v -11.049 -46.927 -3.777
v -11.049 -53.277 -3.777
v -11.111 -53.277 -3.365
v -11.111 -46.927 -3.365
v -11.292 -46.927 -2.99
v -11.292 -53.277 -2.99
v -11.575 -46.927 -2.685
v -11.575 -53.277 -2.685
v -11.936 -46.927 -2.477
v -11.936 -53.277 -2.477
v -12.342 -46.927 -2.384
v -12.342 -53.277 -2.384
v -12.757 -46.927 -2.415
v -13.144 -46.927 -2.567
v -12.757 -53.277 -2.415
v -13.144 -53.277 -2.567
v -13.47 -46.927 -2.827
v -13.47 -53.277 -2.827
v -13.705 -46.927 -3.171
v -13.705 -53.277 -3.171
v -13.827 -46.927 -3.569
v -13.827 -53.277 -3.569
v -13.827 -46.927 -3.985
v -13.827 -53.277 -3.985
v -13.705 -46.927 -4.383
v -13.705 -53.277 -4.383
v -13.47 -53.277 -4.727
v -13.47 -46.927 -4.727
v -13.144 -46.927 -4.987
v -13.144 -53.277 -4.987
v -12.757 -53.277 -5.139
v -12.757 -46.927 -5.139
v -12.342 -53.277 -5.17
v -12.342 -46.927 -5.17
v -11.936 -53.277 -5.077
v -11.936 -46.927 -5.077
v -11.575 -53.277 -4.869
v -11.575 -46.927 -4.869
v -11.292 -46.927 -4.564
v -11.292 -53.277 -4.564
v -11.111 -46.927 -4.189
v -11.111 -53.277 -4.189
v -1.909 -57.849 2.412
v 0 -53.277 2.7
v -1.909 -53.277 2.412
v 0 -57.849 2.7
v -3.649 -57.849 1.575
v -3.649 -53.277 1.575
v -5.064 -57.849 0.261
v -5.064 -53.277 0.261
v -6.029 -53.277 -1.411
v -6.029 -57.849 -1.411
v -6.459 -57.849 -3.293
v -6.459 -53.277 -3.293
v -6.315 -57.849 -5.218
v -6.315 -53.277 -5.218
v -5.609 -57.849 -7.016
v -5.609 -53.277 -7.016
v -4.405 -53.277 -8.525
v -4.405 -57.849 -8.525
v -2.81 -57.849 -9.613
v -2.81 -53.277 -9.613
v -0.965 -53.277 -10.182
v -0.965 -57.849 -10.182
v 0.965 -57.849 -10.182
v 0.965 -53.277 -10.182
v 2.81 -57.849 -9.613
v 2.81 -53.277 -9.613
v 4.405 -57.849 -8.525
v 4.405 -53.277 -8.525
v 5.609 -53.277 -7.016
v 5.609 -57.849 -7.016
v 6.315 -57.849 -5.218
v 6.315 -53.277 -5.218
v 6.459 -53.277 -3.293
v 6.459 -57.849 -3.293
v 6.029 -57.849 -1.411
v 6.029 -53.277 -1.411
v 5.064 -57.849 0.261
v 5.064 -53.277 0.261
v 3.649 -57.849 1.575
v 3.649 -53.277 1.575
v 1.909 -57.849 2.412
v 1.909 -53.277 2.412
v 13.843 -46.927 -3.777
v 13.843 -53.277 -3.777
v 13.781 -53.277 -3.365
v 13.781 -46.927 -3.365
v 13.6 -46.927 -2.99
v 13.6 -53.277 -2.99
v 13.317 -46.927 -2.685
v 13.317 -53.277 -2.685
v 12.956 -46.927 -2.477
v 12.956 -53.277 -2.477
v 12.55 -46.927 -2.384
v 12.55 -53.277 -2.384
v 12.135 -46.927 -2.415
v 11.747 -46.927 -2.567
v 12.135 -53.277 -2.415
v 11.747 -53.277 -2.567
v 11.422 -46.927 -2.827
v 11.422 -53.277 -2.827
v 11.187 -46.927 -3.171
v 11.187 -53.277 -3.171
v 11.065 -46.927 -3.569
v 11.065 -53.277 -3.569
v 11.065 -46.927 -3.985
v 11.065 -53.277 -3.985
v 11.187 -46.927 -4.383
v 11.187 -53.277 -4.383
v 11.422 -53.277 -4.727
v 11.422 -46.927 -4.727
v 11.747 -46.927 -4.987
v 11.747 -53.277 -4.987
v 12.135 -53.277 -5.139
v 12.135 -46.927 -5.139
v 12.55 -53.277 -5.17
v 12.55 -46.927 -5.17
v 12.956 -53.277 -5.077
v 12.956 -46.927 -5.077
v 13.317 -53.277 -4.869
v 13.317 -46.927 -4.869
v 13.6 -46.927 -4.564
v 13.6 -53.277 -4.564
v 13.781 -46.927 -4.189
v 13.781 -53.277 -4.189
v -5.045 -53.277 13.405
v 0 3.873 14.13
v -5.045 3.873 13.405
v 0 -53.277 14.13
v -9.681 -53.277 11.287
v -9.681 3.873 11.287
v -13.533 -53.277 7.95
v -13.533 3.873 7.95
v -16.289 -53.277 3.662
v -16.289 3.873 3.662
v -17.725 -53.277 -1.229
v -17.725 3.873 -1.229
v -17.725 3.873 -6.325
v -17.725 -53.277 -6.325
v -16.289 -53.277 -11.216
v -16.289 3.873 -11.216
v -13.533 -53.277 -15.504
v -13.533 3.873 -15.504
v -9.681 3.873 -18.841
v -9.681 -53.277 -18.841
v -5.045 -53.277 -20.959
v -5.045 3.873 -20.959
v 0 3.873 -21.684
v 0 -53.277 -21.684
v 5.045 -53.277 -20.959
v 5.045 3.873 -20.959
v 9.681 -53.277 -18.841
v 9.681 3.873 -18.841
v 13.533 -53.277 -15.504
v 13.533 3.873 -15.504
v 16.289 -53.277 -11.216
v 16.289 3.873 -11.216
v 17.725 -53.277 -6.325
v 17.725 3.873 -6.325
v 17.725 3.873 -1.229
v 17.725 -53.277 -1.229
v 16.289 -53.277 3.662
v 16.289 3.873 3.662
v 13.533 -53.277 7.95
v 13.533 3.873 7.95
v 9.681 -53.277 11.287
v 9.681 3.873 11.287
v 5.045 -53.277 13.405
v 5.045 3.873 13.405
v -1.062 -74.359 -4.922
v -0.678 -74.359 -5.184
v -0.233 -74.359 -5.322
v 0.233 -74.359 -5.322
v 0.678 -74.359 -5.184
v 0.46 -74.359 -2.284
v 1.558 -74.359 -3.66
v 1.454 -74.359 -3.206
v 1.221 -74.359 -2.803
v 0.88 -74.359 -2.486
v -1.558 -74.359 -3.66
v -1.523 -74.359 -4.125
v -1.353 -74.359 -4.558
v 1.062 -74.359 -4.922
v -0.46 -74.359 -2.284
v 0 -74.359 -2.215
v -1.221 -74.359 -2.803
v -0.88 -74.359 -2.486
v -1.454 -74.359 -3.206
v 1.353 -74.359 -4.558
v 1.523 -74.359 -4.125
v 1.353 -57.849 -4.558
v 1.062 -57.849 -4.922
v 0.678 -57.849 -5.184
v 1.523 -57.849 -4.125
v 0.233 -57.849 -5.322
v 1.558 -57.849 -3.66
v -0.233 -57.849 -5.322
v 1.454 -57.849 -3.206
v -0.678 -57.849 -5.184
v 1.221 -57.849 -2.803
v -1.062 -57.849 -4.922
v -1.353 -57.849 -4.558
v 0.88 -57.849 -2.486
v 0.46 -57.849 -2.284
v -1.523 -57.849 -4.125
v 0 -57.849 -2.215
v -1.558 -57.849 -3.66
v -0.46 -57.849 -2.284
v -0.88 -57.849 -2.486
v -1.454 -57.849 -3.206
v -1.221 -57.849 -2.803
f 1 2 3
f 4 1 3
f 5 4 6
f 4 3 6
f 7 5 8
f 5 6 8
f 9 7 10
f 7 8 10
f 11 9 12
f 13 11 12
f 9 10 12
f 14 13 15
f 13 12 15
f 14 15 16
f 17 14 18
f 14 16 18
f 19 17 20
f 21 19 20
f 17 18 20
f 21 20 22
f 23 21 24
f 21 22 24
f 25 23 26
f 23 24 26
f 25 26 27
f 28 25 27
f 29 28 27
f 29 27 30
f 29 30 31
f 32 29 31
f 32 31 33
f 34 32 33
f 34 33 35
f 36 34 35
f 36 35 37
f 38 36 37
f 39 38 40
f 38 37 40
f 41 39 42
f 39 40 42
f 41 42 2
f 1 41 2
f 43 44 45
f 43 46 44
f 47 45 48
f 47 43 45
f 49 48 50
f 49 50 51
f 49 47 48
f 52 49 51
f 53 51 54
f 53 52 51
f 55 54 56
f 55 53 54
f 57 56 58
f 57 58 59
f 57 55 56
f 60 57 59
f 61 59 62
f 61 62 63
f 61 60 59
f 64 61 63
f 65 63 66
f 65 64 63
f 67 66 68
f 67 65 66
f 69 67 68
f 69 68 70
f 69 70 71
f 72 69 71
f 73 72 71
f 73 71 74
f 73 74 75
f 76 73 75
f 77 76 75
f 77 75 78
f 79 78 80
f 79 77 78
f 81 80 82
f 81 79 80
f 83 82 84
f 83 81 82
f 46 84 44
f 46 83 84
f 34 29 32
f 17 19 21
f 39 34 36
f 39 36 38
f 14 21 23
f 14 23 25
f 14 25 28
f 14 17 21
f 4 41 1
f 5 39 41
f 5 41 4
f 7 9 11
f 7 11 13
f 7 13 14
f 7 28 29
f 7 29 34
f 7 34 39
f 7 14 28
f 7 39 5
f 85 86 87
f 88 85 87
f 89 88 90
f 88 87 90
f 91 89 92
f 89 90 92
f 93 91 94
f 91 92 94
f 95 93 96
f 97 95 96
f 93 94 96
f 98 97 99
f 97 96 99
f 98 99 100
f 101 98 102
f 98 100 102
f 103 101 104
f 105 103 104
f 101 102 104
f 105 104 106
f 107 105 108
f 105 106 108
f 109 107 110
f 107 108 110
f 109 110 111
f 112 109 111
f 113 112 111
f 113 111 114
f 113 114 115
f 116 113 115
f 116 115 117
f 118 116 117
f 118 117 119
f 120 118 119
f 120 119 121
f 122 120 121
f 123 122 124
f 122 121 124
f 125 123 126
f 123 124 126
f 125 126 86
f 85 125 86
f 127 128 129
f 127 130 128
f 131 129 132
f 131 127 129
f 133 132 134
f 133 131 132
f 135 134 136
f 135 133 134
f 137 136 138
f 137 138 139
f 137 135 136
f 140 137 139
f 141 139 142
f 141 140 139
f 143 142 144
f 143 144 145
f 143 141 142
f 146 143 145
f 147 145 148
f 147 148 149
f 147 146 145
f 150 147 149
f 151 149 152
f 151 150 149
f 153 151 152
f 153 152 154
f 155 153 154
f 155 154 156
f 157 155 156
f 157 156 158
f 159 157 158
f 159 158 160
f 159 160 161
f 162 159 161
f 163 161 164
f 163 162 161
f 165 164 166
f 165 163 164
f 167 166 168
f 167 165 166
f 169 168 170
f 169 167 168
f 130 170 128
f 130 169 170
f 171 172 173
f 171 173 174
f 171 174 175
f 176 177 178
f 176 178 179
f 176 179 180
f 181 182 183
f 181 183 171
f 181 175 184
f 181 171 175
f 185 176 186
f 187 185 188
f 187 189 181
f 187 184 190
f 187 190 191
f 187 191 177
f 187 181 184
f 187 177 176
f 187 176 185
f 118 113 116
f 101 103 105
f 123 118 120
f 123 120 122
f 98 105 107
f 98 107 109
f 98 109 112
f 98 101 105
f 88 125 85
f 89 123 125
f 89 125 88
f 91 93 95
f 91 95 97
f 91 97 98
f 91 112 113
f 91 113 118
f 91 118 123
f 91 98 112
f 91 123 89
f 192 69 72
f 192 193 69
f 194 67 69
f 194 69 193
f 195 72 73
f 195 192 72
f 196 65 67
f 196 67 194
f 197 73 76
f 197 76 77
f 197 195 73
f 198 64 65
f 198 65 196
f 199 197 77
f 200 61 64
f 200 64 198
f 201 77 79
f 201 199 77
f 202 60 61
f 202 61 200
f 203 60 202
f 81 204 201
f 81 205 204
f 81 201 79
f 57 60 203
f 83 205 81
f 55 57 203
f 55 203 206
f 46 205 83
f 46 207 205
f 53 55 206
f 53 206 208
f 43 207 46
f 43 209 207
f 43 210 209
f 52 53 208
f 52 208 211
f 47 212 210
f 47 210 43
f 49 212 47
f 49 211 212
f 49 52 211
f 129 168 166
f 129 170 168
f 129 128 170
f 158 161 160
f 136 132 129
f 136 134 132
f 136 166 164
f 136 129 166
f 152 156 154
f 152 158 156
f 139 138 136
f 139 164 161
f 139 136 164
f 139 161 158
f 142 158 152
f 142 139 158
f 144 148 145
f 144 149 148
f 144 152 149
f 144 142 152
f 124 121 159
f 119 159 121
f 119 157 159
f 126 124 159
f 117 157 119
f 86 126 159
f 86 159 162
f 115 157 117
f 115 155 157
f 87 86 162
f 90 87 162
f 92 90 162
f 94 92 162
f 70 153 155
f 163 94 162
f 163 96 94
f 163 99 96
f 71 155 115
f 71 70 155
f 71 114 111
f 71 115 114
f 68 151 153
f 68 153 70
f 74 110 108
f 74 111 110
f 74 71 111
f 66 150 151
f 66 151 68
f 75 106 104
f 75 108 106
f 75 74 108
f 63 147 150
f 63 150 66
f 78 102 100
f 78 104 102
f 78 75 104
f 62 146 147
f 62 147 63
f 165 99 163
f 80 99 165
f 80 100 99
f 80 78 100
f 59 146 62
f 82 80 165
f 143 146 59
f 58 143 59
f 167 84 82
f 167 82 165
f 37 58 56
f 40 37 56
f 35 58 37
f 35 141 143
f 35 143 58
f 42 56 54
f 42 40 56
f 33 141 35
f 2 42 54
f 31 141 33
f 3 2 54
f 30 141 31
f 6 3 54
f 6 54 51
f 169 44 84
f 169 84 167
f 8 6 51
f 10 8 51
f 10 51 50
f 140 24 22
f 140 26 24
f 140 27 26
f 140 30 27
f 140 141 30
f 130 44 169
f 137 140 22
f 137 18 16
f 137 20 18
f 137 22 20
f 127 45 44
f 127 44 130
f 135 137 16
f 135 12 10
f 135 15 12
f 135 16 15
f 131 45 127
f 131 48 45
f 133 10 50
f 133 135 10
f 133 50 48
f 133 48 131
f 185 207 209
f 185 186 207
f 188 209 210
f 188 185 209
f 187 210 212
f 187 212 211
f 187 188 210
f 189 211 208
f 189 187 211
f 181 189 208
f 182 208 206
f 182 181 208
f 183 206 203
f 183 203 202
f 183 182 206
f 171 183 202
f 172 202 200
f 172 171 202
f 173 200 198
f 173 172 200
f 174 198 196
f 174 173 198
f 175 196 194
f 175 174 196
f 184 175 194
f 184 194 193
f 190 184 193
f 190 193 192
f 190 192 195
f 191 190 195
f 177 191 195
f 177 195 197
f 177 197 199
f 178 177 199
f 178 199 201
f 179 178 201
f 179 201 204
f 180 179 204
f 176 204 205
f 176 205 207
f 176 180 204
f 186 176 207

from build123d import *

# Parameters (mm, degrees)
F2_R     = 1.397
F3_DEPTH = 6.35


with BuildPart() as f1:
    # F0 (on Right) → F1 (revolve)
    with BuildSketch(Plane.YZ):
        Polygon((-74.35899, -3.777042), (3.87301, -3.777042), (3.87301, 14.129958), (-53.27699, 14.129958), (-53.27699, 2.699958), (-57.84899, 2.699958), (-57.84899, -2.214942), (-74.35899, -2.214942), align=None)
    revolve(axis=Axis((0, -35.24299, -3.777042), (0, -1, 0)))

    # F2 (on face) → F3 (cut)
    with BuildSketch(Plane.XZ.offset(53.27699)):
        with Locations((12.446, -3.777042)):
            Circle(F2_R)
        with Locations((-12.446, -3.777042)):
            Circle(F2_R)
    extrude(amount=-F3_DEPTH, mode=Mode.SUBTRACT)


solid = f1.part
